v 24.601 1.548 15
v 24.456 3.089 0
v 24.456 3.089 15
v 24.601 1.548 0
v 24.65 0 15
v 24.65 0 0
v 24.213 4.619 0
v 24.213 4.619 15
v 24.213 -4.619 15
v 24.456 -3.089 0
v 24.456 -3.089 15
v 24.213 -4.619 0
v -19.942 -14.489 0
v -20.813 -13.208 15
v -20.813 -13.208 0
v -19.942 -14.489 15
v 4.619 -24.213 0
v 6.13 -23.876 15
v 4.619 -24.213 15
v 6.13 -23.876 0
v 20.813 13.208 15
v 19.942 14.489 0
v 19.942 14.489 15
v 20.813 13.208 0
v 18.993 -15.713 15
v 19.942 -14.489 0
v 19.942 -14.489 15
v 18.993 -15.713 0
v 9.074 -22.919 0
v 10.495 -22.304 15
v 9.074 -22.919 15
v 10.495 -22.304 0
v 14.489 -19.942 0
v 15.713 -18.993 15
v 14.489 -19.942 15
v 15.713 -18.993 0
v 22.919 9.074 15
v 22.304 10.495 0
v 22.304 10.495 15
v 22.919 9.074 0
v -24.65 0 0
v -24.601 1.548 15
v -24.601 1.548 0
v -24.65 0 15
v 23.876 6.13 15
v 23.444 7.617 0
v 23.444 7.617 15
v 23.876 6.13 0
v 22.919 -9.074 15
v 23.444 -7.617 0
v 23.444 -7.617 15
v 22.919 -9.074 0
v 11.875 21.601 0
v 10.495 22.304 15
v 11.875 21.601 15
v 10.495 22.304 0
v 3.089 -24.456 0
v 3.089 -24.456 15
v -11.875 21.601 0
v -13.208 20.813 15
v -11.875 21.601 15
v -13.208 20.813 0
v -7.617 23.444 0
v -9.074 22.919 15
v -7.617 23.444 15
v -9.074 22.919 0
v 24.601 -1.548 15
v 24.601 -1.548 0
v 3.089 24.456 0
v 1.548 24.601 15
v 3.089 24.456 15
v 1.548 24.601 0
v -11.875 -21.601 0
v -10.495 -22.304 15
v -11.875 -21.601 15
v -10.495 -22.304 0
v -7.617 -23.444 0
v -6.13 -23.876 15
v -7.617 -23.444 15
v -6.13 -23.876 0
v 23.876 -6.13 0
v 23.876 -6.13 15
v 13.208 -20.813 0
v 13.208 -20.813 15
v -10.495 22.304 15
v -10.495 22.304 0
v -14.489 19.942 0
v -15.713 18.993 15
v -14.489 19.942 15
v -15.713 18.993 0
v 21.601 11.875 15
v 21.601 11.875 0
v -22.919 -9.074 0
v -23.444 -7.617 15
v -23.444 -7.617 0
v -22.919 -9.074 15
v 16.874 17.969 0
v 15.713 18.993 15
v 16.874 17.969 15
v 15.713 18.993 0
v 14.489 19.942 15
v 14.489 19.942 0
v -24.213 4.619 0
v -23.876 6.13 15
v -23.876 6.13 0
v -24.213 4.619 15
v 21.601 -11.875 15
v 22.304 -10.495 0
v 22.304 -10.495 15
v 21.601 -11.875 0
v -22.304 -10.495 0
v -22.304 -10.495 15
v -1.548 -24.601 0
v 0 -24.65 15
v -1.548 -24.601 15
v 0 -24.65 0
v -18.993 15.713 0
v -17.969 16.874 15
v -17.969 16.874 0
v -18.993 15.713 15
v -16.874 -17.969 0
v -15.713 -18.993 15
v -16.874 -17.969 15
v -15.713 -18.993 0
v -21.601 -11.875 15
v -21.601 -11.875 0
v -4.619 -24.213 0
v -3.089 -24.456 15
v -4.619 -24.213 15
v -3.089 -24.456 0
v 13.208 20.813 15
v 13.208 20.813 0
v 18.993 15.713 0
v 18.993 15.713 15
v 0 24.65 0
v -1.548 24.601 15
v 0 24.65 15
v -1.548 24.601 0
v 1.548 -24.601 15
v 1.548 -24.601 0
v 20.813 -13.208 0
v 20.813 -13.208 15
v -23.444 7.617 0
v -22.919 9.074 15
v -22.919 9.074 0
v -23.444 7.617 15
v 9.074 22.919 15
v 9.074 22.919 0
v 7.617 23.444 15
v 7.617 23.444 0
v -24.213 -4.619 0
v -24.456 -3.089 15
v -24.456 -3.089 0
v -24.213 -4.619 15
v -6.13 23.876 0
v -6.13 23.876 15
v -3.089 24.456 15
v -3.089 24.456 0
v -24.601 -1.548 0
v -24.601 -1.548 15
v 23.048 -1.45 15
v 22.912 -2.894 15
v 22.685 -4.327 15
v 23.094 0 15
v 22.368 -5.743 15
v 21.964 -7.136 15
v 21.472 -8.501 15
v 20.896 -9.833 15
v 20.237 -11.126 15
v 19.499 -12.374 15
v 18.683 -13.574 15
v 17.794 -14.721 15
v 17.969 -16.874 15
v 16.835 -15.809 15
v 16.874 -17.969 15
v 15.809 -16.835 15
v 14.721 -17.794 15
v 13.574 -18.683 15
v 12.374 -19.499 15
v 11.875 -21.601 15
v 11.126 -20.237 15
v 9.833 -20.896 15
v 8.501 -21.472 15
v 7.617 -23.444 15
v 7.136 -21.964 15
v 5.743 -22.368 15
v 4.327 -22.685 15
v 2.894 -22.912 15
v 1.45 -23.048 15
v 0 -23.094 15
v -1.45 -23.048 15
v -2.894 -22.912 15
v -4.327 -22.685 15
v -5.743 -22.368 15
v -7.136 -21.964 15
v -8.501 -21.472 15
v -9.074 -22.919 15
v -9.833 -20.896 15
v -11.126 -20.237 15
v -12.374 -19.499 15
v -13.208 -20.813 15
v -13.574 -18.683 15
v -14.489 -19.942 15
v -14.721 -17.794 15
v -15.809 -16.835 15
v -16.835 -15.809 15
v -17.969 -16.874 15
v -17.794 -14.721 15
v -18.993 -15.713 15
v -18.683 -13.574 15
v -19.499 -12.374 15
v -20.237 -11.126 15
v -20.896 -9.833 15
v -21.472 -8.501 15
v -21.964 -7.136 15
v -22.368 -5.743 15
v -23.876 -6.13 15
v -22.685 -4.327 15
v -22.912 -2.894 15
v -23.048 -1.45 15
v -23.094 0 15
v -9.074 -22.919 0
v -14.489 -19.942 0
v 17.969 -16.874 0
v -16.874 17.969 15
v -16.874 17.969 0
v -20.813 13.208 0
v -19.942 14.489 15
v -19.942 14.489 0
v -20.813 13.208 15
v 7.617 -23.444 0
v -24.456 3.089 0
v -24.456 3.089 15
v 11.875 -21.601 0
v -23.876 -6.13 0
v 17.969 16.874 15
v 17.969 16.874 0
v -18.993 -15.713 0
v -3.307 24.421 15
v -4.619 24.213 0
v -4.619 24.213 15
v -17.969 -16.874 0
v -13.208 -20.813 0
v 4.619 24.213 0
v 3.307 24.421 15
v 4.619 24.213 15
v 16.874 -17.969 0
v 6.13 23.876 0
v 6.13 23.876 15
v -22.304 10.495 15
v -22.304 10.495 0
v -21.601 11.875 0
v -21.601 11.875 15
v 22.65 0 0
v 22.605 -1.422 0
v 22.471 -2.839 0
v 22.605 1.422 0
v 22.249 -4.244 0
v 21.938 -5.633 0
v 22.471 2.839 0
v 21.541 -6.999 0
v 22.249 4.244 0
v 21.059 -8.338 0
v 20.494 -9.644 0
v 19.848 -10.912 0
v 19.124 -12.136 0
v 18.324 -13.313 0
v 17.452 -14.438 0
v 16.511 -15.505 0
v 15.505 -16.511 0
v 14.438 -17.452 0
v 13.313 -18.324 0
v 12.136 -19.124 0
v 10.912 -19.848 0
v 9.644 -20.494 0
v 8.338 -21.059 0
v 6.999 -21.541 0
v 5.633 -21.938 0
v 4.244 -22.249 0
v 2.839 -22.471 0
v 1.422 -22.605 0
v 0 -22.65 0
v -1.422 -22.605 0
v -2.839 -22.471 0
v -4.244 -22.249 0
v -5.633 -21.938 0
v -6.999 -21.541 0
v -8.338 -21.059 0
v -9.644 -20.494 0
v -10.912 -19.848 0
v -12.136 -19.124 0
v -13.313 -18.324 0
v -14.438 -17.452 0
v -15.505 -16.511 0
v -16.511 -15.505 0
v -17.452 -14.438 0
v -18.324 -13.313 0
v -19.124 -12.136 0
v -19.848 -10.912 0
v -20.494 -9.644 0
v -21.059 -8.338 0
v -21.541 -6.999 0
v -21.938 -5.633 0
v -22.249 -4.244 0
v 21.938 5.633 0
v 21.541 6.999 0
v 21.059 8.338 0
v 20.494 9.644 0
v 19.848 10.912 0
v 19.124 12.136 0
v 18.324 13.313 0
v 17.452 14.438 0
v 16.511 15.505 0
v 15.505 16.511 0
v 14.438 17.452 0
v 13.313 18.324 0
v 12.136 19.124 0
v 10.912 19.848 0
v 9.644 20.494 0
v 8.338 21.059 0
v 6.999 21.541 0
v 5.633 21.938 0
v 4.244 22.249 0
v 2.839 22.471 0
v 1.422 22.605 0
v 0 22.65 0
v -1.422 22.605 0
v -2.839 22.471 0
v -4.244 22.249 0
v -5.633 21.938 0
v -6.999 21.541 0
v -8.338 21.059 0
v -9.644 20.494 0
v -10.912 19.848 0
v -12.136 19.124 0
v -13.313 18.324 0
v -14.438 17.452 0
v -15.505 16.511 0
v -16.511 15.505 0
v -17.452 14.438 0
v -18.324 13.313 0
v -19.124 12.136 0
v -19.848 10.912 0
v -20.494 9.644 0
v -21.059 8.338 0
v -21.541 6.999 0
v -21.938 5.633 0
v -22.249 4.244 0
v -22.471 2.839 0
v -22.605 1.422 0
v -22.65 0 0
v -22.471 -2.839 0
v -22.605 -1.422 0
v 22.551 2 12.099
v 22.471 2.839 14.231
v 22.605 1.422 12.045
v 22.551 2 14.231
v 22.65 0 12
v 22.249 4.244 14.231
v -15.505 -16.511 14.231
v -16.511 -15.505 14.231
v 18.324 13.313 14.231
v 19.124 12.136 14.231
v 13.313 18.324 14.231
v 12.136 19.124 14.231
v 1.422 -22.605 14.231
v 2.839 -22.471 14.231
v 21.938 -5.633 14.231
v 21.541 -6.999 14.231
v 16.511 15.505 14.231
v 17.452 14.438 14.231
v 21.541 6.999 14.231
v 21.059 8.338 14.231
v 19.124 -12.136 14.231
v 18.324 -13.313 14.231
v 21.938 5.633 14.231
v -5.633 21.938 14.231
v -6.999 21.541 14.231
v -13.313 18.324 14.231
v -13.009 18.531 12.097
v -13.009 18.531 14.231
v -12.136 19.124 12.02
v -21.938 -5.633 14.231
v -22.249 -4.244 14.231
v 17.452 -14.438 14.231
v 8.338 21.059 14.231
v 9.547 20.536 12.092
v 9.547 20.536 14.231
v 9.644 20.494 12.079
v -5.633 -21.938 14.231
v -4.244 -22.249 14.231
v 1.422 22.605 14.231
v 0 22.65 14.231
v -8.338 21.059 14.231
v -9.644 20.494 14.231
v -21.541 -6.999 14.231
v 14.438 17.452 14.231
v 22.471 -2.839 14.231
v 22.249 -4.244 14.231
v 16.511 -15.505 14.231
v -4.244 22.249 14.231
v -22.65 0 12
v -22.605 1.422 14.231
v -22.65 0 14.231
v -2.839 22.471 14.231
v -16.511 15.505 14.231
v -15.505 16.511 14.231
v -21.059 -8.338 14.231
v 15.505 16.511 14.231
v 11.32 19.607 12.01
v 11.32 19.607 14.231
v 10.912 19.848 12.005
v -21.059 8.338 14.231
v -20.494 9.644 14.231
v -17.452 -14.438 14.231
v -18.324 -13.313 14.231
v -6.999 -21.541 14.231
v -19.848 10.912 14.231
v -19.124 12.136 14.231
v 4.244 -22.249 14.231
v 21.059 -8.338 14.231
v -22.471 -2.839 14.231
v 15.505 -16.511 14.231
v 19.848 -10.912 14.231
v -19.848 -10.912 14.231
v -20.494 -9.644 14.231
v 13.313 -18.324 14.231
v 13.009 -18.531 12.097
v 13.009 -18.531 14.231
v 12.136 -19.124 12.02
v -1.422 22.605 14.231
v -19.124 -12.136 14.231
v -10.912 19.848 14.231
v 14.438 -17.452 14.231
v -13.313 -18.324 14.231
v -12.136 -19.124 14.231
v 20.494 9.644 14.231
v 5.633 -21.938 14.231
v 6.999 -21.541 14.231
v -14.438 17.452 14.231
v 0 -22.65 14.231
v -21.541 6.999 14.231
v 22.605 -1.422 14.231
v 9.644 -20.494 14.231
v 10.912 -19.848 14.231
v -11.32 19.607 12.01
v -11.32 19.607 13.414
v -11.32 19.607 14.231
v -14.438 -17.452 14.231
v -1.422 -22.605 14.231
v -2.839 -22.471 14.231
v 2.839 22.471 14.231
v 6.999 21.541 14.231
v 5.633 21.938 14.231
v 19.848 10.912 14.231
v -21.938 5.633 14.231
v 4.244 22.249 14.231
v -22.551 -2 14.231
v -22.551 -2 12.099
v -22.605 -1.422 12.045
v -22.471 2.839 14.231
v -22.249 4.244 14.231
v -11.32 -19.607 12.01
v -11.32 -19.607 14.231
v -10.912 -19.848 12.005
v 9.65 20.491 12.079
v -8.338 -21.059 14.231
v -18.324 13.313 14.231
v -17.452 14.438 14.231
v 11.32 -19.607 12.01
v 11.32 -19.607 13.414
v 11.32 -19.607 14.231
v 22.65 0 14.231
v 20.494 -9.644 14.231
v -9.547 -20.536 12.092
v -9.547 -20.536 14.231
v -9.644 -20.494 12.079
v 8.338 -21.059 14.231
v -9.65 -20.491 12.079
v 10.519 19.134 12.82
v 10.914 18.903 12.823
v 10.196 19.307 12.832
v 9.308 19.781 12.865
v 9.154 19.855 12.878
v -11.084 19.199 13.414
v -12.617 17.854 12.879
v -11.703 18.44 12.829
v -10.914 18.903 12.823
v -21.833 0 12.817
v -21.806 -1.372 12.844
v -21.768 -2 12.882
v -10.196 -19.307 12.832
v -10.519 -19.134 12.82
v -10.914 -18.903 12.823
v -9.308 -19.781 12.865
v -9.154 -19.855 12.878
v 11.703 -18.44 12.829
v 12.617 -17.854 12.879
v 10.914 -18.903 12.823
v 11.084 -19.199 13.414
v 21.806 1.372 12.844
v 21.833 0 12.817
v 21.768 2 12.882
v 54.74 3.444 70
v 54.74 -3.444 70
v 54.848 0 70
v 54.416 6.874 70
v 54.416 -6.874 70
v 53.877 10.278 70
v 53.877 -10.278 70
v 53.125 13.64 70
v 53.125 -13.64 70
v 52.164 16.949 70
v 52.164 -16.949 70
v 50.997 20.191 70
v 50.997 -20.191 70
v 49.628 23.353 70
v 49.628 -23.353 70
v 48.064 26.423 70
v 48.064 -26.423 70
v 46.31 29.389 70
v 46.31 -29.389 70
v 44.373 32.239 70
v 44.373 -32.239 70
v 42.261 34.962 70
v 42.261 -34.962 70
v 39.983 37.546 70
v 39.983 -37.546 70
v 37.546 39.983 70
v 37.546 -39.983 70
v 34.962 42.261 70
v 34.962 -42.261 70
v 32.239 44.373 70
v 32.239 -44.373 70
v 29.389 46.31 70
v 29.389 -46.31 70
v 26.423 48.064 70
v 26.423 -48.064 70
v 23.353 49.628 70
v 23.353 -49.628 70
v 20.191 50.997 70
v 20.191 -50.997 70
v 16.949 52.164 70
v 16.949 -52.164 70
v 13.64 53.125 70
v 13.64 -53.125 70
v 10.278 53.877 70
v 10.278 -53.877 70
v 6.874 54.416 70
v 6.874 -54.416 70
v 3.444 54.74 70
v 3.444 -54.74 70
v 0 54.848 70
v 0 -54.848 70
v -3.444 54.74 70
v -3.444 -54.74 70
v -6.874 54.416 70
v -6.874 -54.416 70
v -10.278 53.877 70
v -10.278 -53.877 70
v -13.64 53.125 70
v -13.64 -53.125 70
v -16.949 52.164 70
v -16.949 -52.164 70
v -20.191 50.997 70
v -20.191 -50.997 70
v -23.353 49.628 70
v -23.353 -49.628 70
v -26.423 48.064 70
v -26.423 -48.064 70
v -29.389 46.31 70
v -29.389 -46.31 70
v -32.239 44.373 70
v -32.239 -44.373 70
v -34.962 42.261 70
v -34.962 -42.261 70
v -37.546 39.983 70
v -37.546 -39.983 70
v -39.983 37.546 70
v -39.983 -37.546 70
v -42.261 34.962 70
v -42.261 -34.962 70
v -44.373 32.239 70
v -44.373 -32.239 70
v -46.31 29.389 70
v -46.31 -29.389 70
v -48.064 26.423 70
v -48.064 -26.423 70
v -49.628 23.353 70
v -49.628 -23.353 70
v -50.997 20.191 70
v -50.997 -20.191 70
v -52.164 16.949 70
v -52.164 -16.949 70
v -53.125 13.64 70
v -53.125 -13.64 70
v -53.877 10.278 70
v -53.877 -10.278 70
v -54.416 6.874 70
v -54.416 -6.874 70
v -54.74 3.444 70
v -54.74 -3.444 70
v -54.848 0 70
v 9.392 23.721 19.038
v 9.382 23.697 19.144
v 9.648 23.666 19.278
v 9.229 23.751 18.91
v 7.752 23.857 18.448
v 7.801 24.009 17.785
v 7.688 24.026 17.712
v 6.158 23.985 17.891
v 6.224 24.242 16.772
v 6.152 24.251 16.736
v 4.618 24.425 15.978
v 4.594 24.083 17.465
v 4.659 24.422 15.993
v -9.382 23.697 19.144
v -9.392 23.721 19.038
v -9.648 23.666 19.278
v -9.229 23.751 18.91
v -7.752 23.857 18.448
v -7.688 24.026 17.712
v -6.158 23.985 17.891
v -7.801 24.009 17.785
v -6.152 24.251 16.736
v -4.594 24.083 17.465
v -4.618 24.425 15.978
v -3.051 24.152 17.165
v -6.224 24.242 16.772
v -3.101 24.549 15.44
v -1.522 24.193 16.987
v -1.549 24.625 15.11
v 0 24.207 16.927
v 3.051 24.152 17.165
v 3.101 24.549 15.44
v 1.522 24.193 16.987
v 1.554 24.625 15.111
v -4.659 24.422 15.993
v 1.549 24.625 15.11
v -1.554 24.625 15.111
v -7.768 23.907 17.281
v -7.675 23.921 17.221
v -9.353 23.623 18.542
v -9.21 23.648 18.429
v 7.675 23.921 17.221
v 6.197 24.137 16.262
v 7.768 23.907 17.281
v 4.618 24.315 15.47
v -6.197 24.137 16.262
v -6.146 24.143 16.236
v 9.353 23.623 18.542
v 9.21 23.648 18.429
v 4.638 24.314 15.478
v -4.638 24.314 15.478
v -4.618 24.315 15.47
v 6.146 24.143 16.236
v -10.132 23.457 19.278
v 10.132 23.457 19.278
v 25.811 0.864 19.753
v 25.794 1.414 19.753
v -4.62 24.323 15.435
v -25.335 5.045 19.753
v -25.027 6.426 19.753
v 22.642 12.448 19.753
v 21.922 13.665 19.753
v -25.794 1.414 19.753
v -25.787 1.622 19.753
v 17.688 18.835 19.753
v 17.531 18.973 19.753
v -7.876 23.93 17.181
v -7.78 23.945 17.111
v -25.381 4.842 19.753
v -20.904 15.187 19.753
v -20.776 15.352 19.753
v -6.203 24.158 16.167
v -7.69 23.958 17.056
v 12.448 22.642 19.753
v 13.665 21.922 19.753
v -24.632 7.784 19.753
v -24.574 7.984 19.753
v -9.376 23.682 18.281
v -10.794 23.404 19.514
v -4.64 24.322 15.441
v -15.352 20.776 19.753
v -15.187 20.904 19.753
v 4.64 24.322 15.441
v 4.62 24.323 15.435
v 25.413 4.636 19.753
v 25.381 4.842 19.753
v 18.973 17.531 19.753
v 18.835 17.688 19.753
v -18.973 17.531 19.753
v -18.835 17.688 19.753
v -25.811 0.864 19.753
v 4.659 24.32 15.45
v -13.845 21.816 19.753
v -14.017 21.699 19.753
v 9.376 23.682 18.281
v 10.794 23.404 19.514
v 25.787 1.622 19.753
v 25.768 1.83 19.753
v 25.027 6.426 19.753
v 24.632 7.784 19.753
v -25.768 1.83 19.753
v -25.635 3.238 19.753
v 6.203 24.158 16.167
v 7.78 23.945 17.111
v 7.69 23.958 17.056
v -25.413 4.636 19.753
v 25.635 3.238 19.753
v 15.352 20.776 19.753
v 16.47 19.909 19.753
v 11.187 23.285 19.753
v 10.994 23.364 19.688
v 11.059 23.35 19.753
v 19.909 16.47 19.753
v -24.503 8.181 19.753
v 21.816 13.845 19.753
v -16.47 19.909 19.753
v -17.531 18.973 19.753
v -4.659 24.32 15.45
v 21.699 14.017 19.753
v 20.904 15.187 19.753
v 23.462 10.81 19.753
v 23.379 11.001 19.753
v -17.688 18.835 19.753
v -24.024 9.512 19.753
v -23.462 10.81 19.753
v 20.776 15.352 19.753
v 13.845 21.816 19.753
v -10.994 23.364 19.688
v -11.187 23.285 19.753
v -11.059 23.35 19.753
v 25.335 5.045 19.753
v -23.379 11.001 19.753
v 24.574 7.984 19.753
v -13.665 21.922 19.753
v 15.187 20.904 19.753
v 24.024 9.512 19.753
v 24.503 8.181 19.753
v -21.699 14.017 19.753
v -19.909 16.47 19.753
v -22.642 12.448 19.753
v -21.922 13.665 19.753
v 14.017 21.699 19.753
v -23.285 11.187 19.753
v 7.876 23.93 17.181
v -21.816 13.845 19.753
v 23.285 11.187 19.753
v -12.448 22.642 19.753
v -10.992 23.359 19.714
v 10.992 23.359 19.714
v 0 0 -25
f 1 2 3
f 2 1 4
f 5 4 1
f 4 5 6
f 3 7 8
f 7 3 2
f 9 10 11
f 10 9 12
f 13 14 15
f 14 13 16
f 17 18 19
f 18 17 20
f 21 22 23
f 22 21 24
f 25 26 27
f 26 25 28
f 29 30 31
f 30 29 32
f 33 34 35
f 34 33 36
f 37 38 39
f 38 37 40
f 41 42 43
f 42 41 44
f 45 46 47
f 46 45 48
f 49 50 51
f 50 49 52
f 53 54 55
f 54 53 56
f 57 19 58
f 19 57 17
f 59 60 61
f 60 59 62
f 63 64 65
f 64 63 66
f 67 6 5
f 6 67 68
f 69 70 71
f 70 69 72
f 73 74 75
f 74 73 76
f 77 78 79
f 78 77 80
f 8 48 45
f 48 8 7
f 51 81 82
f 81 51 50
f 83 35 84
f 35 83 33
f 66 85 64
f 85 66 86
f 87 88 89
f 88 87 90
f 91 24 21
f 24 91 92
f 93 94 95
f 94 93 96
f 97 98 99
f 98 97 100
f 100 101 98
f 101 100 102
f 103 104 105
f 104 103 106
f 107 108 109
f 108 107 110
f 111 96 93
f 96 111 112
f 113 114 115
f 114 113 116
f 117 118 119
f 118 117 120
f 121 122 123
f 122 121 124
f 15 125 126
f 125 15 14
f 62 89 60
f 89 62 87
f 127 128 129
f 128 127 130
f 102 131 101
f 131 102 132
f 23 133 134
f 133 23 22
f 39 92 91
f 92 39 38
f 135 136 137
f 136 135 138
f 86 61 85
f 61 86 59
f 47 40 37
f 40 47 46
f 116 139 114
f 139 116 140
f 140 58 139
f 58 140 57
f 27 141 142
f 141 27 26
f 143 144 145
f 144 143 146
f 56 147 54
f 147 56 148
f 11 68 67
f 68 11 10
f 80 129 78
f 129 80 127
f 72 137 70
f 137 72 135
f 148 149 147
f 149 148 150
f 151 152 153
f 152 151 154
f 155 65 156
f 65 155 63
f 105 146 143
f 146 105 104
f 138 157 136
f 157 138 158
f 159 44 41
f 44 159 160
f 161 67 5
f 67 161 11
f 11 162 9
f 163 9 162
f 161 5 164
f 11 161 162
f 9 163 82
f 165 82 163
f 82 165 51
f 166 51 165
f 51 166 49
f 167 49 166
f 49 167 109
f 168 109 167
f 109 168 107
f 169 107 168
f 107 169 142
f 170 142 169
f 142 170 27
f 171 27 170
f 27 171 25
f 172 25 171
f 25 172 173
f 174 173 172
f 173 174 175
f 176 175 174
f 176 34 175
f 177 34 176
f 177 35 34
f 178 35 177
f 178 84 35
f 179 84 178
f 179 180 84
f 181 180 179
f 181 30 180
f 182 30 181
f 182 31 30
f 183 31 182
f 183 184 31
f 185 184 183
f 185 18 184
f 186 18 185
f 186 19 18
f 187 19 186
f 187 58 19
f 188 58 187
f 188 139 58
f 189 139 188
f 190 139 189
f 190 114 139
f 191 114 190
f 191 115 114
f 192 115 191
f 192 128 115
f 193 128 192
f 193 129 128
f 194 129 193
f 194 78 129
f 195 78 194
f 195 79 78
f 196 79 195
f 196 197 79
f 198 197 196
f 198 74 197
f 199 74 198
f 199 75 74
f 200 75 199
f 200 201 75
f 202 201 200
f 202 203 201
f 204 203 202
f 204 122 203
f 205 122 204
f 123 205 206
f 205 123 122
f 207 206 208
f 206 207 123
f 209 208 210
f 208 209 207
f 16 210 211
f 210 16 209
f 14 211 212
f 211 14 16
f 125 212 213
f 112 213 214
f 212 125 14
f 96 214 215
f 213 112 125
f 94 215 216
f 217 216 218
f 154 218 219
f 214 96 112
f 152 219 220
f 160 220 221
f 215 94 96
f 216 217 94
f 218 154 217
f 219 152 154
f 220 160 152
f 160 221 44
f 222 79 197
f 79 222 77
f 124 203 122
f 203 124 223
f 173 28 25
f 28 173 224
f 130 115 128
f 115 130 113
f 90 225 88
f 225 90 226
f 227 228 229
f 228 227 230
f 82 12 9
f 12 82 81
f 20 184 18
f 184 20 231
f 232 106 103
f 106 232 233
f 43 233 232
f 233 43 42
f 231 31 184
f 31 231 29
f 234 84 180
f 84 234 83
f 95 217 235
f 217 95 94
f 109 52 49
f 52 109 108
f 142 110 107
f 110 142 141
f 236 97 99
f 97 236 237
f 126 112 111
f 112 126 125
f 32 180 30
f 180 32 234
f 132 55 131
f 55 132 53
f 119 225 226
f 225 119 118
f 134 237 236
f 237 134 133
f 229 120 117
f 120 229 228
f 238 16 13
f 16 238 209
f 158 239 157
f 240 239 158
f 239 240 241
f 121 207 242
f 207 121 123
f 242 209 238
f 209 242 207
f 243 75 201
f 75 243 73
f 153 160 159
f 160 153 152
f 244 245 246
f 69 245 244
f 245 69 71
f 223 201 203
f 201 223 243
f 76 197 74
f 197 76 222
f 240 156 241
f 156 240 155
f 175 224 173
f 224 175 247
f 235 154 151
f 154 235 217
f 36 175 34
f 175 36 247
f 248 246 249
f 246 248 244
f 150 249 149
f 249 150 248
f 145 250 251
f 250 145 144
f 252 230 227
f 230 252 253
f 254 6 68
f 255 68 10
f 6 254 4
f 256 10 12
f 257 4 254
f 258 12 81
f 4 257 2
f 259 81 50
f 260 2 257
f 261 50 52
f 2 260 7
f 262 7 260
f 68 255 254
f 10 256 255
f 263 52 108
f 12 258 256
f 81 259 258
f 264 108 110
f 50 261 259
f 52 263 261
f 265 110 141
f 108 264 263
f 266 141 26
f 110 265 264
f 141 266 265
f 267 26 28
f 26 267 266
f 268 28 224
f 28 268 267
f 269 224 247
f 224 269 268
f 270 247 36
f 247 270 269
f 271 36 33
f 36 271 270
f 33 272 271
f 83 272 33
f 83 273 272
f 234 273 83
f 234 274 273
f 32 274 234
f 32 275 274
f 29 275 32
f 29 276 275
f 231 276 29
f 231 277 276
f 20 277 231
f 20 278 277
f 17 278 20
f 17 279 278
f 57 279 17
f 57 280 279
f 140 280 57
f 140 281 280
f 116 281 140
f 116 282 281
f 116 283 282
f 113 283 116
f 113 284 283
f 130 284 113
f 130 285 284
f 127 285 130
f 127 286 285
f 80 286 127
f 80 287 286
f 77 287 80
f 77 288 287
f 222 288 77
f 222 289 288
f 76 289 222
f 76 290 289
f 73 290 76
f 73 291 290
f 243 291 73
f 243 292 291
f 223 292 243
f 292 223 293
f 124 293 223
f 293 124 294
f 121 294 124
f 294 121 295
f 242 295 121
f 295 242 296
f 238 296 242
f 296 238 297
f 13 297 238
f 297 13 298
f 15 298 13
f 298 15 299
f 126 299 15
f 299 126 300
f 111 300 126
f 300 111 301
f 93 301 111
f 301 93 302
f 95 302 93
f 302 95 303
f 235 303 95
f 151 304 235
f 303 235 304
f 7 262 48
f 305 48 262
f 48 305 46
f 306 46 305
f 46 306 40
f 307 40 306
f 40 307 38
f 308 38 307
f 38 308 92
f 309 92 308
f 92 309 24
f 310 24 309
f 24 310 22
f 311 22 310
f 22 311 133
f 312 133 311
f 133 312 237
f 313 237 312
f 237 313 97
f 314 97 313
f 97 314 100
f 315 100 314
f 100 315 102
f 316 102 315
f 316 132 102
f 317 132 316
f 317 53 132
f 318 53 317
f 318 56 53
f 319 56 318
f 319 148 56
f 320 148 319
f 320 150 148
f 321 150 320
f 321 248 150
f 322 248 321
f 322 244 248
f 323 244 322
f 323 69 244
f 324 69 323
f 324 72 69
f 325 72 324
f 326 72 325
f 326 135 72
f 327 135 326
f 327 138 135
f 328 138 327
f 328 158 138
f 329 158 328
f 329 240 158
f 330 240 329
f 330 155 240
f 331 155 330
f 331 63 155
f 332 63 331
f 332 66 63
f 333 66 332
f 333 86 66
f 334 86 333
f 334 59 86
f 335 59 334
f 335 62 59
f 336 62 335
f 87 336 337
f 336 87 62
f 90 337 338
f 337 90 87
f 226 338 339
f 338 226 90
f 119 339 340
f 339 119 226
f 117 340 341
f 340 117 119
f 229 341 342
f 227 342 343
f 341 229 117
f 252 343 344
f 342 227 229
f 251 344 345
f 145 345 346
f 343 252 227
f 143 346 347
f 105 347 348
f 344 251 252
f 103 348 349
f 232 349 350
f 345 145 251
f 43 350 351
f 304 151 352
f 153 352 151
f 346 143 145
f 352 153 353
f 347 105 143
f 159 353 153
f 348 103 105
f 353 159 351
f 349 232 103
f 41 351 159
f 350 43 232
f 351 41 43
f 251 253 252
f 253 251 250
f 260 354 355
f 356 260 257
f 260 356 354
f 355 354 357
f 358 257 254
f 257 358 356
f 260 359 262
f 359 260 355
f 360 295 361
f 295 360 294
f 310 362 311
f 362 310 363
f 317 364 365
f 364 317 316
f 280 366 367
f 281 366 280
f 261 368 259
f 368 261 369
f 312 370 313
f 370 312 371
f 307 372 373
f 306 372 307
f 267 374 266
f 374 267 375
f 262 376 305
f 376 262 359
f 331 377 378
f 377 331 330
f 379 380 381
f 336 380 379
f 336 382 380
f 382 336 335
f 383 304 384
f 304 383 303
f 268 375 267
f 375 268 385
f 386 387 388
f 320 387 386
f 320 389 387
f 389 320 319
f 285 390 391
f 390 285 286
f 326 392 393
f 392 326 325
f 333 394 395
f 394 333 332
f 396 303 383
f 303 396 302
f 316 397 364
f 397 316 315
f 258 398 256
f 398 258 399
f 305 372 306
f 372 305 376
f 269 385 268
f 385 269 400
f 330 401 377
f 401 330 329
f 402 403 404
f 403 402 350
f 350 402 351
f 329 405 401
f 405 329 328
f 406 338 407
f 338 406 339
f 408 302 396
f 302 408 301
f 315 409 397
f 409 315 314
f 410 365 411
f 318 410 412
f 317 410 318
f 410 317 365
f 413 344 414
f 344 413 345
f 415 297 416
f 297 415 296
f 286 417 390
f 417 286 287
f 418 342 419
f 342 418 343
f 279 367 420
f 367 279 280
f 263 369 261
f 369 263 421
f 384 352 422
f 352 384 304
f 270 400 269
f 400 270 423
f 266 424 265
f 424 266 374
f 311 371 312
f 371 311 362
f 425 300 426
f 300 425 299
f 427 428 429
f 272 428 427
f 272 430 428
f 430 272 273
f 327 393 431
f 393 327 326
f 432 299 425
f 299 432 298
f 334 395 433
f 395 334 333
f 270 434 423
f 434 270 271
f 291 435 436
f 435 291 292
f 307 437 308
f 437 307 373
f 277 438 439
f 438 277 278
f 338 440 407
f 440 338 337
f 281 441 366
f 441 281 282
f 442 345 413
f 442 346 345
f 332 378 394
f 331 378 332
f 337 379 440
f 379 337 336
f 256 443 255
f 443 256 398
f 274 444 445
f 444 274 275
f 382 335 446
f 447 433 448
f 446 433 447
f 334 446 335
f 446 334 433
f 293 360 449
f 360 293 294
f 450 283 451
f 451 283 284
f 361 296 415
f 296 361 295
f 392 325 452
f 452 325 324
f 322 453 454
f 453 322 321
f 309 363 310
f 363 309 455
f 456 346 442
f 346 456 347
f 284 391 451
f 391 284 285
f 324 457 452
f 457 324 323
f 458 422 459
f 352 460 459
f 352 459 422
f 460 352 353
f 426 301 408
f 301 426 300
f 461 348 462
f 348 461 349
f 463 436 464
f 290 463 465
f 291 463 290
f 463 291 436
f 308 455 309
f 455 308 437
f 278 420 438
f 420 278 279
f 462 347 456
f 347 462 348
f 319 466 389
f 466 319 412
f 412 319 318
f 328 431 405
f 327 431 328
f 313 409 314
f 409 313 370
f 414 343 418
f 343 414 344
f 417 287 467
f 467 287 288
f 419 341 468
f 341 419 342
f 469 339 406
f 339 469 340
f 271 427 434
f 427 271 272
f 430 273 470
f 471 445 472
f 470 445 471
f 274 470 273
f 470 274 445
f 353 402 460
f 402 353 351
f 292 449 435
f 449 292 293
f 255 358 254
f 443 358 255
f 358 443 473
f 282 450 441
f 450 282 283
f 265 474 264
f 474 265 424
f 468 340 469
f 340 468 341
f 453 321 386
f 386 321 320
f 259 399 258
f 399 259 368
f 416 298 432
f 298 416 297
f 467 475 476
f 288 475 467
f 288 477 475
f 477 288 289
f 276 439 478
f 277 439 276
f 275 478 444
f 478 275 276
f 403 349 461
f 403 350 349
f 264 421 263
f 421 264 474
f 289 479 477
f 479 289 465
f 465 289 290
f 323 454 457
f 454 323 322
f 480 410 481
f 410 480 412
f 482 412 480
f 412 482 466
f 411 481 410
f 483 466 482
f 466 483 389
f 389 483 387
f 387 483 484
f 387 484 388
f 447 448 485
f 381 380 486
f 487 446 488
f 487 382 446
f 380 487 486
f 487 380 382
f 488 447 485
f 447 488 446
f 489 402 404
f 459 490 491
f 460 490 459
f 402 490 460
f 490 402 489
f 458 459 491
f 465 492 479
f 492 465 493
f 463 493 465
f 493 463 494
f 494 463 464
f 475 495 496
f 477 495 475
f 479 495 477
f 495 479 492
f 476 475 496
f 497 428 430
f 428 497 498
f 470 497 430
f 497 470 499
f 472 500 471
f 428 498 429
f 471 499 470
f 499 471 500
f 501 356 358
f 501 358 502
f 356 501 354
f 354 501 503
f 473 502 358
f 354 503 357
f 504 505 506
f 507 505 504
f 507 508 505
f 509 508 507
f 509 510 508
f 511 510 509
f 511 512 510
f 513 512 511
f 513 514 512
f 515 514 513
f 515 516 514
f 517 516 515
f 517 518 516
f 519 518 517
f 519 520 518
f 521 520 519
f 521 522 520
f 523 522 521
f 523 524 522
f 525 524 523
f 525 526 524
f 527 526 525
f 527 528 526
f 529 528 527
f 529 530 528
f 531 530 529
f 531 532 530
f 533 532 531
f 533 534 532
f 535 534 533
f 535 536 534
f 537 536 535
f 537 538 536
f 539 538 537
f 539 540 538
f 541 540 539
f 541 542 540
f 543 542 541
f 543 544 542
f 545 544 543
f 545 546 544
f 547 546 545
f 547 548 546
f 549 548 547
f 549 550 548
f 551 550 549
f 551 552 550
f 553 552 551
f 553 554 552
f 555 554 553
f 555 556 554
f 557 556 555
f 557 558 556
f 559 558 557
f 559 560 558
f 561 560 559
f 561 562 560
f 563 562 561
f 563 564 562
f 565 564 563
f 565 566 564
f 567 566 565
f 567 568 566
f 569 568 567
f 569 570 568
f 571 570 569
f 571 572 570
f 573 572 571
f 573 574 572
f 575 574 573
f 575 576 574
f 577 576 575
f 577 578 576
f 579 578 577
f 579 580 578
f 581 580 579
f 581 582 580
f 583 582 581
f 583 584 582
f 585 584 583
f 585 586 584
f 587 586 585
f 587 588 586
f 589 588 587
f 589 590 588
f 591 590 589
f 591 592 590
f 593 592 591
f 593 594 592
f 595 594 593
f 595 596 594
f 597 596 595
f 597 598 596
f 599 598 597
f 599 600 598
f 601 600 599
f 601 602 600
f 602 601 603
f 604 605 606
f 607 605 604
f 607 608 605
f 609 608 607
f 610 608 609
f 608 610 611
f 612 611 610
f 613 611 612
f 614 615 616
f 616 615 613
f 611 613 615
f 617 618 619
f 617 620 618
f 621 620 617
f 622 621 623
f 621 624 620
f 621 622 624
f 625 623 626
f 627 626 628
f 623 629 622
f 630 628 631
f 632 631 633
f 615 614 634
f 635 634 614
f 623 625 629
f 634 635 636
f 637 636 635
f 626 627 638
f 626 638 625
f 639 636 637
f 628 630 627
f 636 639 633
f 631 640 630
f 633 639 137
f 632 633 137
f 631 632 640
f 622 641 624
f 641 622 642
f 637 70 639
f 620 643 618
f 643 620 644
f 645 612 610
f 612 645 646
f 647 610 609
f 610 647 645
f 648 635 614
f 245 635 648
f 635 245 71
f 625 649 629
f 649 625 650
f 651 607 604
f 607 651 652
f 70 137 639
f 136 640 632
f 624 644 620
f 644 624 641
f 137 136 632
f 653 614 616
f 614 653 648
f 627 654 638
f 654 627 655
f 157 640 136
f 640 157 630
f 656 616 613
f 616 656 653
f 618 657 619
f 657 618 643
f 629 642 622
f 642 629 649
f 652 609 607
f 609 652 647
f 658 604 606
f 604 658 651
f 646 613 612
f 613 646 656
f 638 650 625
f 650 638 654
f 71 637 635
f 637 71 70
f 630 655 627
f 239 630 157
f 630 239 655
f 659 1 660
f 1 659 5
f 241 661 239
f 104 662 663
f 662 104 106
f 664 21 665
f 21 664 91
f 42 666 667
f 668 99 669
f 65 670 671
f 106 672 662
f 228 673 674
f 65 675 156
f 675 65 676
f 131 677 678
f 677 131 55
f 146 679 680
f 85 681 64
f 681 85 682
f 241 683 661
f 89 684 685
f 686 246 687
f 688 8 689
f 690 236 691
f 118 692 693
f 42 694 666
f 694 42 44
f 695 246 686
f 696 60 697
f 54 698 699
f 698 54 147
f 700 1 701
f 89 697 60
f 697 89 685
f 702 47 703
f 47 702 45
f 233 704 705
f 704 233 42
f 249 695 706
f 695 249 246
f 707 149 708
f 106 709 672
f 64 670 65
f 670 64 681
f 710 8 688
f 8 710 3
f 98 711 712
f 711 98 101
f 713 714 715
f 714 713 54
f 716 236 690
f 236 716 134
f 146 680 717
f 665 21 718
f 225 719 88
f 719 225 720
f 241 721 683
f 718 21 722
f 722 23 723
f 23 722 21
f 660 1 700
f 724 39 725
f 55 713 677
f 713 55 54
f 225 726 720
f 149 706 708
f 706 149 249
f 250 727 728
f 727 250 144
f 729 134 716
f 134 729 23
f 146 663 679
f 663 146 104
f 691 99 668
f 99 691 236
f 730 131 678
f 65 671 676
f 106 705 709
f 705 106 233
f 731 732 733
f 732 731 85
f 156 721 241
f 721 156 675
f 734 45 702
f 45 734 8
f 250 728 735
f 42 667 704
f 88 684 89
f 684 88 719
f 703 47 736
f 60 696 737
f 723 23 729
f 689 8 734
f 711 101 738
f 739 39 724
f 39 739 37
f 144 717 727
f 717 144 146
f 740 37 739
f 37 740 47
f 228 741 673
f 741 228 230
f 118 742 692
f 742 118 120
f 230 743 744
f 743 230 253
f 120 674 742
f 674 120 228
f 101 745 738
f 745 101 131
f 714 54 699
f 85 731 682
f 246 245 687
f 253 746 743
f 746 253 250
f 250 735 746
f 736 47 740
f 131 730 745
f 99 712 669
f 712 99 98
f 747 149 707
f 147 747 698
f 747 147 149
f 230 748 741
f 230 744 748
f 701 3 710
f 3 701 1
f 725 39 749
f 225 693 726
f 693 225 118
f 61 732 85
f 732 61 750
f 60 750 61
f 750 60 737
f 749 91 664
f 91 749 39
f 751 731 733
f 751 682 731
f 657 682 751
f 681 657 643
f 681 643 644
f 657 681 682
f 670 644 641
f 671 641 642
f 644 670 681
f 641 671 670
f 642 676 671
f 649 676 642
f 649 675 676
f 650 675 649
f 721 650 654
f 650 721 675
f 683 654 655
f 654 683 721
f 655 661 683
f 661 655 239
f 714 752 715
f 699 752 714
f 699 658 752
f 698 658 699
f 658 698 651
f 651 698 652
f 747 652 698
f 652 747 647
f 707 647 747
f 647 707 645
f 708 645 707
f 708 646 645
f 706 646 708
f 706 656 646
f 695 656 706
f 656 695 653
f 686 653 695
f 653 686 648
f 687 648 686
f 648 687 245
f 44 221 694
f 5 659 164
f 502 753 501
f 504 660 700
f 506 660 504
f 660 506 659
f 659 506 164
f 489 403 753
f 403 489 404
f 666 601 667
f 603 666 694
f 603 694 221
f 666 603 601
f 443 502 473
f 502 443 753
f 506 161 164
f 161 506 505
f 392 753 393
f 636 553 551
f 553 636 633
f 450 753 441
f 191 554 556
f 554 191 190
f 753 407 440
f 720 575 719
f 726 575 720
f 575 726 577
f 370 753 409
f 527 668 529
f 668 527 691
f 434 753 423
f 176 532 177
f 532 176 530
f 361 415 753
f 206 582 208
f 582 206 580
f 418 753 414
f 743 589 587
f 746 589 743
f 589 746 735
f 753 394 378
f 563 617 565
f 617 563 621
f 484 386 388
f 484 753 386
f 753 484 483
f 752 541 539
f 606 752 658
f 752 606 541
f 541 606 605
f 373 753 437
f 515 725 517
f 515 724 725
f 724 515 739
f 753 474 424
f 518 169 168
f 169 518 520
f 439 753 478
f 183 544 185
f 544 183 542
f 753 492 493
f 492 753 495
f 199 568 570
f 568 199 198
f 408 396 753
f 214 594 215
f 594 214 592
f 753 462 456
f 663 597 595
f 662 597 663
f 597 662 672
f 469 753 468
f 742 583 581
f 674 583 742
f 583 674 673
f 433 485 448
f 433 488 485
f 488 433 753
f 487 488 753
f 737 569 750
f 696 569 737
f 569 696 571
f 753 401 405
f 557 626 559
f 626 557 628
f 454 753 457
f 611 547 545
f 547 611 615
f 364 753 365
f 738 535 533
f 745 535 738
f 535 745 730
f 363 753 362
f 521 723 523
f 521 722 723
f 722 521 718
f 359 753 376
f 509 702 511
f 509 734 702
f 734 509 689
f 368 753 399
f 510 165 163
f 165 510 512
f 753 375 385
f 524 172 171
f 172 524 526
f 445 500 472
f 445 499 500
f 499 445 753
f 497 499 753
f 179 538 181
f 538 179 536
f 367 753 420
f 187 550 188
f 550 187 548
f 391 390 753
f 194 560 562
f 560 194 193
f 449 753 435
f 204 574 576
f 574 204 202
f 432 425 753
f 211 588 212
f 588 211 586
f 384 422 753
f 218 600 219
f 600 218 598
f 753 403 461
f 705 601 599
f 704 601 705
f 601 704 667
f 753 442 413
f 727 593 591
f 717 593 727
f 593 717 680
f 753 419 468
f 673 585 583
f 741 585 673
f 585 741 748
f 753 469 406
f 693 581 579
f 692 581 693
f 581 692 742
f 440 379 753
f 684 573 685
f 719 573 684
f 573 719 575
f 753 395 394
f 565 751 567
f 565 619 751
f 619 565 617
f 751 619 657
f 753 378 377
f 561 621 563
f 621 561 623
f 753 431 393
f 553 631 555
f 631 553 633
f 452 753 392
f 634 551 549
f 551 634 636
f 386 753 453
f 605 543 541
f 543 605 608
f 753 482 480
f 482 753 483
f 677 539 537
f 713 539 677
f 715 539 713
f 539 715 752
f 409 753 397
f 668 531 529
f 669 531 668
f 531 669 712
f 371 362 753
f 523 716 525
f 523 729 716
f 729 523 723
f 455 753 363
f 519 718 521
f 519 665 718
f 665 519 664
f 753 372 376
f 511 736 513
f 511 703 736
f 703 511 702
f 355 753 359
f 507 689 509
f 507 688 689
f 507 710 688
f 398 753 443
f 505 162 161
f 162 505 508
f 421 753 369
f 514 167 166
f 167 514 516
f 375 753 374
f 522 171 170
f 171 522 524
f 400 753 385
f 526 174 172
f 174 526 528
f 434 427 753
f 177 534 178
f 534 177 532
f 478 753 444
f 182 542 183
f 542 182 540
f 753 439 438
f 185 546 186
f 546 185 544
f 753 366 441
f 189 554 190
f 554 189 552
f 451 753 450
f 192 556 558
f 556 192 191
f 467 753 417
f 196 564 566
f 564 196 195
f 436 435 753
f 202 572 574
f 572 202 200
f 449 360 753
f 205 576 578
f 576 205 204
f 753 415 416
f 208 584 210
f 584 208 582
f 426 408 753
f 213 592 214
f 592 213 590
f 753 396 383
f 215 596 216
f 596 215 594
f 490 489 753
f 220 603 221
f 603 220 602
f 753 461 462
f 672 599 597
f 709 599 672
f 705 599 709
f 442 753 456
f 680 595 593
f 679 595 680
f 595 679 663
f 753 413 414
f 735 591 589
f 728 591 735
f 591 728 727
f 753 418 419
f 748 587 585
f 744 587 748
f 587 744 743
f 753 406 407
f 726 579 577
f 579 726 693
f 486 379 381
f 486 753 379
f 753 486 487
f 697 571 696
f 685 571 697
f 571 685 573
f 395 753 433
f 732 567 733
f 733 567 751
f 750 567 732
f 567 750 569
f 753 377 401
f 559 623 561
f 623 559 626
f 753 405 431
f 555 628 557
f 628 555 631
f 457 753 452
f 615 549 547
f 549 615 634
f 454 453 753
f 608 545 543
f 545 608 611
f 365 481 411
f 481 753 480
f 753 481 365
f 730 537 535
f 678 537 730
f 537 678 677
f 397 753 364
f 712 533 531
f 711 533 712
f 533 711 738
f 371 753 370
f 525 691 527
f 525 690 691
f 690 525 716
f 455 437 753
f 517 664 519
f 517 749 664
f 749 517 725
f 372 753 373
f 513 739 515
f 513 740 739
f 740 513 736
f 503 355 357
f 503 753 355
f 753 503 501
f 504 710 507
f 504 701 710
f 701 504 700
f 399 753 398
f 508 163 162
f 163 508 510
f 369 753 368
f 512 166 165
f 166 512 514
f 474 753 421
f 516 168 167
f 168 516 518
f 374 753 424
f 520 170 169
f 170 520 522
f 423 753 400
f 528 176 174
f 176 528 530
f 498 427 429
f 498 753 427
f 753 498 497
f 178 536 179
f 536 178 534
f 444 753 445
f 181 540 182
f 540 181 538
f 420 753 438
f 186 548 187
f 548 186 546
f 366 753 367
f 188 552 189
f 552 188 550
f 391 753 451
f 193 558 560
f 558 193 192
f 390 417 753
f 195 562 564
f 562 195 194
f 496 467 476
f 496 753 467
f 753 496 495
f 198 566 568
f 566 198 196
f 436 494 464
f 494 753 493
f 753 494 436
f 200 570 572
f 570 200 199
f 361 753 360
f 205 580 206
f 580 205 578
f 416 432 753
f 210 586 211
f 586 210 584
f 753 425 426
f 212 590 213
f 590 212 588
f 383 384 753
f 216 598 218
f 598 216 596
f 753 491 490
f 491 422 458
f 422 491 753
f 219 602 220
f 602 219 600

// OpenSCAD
// ---- parameters ----

torch_diameter = 45.3;
cutted_beam_min_radius = 10;

thickness = 2;

reflector_overhang = 55;
ring_height = 15;

preview = true;    // remark it for STL output
beam_length = 95;  // change it to see how beam is cutted

// --------------------

$fn=100;

module beam(angle,length=100) {
  translate([0,0,-25]) cylinder(r1 = 0, r2 = tan(angle)*length, h=length);
}

module ring(height, d1=torch_diameter, d2=torch_diameter) {
	difference() {
		cylinder(height, d1 = d1 + thickness*2, d2 = d2 + thickness*2);
		translate([0,0,-1]) cylinder(height+2, d1 = d1, d2 = d2);
	}	
}

module partialCylinder(r, t, h, seq) {
	side = sqrt(pow(r,2)-pow(r-t,2)) * 2;
	offset = side * seq;
	difference() {
    translate([offset, r-t, 0]) cylinder(h=h, r=r);
    translate([offset-r, 0, -0.1]) cube([2*r, 2*r, h+1]);
		rotate([135, 0, 0]) translate([-side/2, 0, 0]) cube([side, r, r]);
	}
}

module reflector(y_size=thickness, flat=false) {
	module x() {
		translate([-0.1, 0, 0]) cube([width, y_size, reflector_overhang]);
		if (!flat) {
			for(seq=[0:1])
				partialCylinder(10, 2, reflector_overhang, seq);
		}
	}
 	height = sqrt(pow(reflector_overhang-thickness*2, 2) + pow(cutted_beam_min_radius, 2));
	width = 100;
	multmatrix(m=[[1, 0, 0, 0],
								[0, 1, (cutted_beam_min_radius*2-torch_diameter)/2/reflector_overhang, torch_diameter/2],
								[0, 0, 1, 0],
								[0, 0, 0, 1]])
	  union() {
			x();
			mirror([1,0,0]) x();
		}
}

module beam_cutter() {
	d2 = torch_diameter+reflector_overhang/2;

	intersection() {
		reflector();
		cylinder(d1 = torch_diameter+thickness*2, d2=d2, h=reflector_overhang);
	}

	difference() {
		ring(reflector_overhang, d1=torch_diameter, d2=d2);
		translate([0, thickness, -0.01]) scale([1.01, 0.99, 1.01]) reflector(100, true);
		multmatrix(m=[[1, 0, 0, -100],
		              [0, 1, cutted_beam_min_radius/reflector_overhang, -100],
		              [0, 0, 1, 0],
		              [0, 0, 0, 1]])
		  cube([200, 100, 100]);
	}
}

module whole() {
	ring(ring_height);
	for(n=[1:6]) {
		rotate([0,0,n*60]) {
			translate([torch_diameter/2, 0, ring_height-3]) rotate([0, -45, 0]) cube([2,2,2]);
		}
	};
	translate([0, 0, ring_height]) beam_cutter();
}


if (preview) {
	whole();
	color("Red", 0.5) beam(7, beam_length);
	color("OrangeRed", 0.3) beam(30, beam_length);
} else {
	whole();
}
